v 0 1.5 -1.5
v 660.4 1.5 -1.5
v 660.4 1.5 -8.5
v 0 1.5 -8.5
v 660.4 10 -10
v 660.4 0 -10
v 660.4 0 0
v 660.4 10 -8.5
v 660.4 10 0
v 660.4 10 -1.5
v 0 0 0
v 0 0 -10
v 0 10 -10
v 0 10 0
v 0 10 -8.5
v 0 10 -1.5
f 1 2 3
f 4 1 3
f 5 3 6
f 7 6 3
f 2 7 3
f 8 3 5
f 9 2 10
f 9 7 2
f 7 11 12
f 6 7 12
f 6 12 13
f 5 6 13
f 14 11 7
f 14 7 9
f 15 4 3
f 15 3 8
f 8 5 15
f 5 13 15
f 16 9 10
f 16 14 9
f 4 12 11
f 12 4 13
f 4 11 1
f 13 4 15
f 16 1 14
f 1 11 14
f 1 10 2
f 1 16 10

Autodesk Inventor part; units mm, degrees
ref_plane "YZ Plane" through (0, 0, 0) normal (1, 0, 0) x (0, 1, 0)
ref_plane "XZ Plane" through (0, 0, 0) normal (0, 1, 0) x (-1, 0, 0)
ref_plane "XY Plane" through (0, 0, 0) normal (0, 0, 1) x (1, 0, 0)
sketch "Sketch1" plane through (0, 0, 0) normal (1, 0, 0) x (0, 1, 0)
  line L0 (0, 0) -> (0, -10)
  line L1 (0, -10) -> (10, -10)
  line L2 (10, -10) -> (10, -8.5)
  line L3 (0, 0) -> (10, 0)
  line L4 (10, 0) -> (10, -1.5)
  line L5 (0, -5) -> (1.5, -5) construction
  line L6 (10, -1.5) -> (1.5, -1.5)
  line L7 (1.5, -1.5) -> (1.5, -8.5)
  line L8 (1.5, -8.5) -> (10, -8.5)
  dimension "d0" = 10
  dimension "d1" = 10
  dimension "d2" = 1.5
  dimension "d3" = 10
  dimension "d4" = 1.5
  dimension "d5" = 1.5
extrude "Extrusion1" add sketch "Sketch1" along normal blind 660.4
properties part number "26in mini C-Channel (rail)" material "Aluminum 6061"
